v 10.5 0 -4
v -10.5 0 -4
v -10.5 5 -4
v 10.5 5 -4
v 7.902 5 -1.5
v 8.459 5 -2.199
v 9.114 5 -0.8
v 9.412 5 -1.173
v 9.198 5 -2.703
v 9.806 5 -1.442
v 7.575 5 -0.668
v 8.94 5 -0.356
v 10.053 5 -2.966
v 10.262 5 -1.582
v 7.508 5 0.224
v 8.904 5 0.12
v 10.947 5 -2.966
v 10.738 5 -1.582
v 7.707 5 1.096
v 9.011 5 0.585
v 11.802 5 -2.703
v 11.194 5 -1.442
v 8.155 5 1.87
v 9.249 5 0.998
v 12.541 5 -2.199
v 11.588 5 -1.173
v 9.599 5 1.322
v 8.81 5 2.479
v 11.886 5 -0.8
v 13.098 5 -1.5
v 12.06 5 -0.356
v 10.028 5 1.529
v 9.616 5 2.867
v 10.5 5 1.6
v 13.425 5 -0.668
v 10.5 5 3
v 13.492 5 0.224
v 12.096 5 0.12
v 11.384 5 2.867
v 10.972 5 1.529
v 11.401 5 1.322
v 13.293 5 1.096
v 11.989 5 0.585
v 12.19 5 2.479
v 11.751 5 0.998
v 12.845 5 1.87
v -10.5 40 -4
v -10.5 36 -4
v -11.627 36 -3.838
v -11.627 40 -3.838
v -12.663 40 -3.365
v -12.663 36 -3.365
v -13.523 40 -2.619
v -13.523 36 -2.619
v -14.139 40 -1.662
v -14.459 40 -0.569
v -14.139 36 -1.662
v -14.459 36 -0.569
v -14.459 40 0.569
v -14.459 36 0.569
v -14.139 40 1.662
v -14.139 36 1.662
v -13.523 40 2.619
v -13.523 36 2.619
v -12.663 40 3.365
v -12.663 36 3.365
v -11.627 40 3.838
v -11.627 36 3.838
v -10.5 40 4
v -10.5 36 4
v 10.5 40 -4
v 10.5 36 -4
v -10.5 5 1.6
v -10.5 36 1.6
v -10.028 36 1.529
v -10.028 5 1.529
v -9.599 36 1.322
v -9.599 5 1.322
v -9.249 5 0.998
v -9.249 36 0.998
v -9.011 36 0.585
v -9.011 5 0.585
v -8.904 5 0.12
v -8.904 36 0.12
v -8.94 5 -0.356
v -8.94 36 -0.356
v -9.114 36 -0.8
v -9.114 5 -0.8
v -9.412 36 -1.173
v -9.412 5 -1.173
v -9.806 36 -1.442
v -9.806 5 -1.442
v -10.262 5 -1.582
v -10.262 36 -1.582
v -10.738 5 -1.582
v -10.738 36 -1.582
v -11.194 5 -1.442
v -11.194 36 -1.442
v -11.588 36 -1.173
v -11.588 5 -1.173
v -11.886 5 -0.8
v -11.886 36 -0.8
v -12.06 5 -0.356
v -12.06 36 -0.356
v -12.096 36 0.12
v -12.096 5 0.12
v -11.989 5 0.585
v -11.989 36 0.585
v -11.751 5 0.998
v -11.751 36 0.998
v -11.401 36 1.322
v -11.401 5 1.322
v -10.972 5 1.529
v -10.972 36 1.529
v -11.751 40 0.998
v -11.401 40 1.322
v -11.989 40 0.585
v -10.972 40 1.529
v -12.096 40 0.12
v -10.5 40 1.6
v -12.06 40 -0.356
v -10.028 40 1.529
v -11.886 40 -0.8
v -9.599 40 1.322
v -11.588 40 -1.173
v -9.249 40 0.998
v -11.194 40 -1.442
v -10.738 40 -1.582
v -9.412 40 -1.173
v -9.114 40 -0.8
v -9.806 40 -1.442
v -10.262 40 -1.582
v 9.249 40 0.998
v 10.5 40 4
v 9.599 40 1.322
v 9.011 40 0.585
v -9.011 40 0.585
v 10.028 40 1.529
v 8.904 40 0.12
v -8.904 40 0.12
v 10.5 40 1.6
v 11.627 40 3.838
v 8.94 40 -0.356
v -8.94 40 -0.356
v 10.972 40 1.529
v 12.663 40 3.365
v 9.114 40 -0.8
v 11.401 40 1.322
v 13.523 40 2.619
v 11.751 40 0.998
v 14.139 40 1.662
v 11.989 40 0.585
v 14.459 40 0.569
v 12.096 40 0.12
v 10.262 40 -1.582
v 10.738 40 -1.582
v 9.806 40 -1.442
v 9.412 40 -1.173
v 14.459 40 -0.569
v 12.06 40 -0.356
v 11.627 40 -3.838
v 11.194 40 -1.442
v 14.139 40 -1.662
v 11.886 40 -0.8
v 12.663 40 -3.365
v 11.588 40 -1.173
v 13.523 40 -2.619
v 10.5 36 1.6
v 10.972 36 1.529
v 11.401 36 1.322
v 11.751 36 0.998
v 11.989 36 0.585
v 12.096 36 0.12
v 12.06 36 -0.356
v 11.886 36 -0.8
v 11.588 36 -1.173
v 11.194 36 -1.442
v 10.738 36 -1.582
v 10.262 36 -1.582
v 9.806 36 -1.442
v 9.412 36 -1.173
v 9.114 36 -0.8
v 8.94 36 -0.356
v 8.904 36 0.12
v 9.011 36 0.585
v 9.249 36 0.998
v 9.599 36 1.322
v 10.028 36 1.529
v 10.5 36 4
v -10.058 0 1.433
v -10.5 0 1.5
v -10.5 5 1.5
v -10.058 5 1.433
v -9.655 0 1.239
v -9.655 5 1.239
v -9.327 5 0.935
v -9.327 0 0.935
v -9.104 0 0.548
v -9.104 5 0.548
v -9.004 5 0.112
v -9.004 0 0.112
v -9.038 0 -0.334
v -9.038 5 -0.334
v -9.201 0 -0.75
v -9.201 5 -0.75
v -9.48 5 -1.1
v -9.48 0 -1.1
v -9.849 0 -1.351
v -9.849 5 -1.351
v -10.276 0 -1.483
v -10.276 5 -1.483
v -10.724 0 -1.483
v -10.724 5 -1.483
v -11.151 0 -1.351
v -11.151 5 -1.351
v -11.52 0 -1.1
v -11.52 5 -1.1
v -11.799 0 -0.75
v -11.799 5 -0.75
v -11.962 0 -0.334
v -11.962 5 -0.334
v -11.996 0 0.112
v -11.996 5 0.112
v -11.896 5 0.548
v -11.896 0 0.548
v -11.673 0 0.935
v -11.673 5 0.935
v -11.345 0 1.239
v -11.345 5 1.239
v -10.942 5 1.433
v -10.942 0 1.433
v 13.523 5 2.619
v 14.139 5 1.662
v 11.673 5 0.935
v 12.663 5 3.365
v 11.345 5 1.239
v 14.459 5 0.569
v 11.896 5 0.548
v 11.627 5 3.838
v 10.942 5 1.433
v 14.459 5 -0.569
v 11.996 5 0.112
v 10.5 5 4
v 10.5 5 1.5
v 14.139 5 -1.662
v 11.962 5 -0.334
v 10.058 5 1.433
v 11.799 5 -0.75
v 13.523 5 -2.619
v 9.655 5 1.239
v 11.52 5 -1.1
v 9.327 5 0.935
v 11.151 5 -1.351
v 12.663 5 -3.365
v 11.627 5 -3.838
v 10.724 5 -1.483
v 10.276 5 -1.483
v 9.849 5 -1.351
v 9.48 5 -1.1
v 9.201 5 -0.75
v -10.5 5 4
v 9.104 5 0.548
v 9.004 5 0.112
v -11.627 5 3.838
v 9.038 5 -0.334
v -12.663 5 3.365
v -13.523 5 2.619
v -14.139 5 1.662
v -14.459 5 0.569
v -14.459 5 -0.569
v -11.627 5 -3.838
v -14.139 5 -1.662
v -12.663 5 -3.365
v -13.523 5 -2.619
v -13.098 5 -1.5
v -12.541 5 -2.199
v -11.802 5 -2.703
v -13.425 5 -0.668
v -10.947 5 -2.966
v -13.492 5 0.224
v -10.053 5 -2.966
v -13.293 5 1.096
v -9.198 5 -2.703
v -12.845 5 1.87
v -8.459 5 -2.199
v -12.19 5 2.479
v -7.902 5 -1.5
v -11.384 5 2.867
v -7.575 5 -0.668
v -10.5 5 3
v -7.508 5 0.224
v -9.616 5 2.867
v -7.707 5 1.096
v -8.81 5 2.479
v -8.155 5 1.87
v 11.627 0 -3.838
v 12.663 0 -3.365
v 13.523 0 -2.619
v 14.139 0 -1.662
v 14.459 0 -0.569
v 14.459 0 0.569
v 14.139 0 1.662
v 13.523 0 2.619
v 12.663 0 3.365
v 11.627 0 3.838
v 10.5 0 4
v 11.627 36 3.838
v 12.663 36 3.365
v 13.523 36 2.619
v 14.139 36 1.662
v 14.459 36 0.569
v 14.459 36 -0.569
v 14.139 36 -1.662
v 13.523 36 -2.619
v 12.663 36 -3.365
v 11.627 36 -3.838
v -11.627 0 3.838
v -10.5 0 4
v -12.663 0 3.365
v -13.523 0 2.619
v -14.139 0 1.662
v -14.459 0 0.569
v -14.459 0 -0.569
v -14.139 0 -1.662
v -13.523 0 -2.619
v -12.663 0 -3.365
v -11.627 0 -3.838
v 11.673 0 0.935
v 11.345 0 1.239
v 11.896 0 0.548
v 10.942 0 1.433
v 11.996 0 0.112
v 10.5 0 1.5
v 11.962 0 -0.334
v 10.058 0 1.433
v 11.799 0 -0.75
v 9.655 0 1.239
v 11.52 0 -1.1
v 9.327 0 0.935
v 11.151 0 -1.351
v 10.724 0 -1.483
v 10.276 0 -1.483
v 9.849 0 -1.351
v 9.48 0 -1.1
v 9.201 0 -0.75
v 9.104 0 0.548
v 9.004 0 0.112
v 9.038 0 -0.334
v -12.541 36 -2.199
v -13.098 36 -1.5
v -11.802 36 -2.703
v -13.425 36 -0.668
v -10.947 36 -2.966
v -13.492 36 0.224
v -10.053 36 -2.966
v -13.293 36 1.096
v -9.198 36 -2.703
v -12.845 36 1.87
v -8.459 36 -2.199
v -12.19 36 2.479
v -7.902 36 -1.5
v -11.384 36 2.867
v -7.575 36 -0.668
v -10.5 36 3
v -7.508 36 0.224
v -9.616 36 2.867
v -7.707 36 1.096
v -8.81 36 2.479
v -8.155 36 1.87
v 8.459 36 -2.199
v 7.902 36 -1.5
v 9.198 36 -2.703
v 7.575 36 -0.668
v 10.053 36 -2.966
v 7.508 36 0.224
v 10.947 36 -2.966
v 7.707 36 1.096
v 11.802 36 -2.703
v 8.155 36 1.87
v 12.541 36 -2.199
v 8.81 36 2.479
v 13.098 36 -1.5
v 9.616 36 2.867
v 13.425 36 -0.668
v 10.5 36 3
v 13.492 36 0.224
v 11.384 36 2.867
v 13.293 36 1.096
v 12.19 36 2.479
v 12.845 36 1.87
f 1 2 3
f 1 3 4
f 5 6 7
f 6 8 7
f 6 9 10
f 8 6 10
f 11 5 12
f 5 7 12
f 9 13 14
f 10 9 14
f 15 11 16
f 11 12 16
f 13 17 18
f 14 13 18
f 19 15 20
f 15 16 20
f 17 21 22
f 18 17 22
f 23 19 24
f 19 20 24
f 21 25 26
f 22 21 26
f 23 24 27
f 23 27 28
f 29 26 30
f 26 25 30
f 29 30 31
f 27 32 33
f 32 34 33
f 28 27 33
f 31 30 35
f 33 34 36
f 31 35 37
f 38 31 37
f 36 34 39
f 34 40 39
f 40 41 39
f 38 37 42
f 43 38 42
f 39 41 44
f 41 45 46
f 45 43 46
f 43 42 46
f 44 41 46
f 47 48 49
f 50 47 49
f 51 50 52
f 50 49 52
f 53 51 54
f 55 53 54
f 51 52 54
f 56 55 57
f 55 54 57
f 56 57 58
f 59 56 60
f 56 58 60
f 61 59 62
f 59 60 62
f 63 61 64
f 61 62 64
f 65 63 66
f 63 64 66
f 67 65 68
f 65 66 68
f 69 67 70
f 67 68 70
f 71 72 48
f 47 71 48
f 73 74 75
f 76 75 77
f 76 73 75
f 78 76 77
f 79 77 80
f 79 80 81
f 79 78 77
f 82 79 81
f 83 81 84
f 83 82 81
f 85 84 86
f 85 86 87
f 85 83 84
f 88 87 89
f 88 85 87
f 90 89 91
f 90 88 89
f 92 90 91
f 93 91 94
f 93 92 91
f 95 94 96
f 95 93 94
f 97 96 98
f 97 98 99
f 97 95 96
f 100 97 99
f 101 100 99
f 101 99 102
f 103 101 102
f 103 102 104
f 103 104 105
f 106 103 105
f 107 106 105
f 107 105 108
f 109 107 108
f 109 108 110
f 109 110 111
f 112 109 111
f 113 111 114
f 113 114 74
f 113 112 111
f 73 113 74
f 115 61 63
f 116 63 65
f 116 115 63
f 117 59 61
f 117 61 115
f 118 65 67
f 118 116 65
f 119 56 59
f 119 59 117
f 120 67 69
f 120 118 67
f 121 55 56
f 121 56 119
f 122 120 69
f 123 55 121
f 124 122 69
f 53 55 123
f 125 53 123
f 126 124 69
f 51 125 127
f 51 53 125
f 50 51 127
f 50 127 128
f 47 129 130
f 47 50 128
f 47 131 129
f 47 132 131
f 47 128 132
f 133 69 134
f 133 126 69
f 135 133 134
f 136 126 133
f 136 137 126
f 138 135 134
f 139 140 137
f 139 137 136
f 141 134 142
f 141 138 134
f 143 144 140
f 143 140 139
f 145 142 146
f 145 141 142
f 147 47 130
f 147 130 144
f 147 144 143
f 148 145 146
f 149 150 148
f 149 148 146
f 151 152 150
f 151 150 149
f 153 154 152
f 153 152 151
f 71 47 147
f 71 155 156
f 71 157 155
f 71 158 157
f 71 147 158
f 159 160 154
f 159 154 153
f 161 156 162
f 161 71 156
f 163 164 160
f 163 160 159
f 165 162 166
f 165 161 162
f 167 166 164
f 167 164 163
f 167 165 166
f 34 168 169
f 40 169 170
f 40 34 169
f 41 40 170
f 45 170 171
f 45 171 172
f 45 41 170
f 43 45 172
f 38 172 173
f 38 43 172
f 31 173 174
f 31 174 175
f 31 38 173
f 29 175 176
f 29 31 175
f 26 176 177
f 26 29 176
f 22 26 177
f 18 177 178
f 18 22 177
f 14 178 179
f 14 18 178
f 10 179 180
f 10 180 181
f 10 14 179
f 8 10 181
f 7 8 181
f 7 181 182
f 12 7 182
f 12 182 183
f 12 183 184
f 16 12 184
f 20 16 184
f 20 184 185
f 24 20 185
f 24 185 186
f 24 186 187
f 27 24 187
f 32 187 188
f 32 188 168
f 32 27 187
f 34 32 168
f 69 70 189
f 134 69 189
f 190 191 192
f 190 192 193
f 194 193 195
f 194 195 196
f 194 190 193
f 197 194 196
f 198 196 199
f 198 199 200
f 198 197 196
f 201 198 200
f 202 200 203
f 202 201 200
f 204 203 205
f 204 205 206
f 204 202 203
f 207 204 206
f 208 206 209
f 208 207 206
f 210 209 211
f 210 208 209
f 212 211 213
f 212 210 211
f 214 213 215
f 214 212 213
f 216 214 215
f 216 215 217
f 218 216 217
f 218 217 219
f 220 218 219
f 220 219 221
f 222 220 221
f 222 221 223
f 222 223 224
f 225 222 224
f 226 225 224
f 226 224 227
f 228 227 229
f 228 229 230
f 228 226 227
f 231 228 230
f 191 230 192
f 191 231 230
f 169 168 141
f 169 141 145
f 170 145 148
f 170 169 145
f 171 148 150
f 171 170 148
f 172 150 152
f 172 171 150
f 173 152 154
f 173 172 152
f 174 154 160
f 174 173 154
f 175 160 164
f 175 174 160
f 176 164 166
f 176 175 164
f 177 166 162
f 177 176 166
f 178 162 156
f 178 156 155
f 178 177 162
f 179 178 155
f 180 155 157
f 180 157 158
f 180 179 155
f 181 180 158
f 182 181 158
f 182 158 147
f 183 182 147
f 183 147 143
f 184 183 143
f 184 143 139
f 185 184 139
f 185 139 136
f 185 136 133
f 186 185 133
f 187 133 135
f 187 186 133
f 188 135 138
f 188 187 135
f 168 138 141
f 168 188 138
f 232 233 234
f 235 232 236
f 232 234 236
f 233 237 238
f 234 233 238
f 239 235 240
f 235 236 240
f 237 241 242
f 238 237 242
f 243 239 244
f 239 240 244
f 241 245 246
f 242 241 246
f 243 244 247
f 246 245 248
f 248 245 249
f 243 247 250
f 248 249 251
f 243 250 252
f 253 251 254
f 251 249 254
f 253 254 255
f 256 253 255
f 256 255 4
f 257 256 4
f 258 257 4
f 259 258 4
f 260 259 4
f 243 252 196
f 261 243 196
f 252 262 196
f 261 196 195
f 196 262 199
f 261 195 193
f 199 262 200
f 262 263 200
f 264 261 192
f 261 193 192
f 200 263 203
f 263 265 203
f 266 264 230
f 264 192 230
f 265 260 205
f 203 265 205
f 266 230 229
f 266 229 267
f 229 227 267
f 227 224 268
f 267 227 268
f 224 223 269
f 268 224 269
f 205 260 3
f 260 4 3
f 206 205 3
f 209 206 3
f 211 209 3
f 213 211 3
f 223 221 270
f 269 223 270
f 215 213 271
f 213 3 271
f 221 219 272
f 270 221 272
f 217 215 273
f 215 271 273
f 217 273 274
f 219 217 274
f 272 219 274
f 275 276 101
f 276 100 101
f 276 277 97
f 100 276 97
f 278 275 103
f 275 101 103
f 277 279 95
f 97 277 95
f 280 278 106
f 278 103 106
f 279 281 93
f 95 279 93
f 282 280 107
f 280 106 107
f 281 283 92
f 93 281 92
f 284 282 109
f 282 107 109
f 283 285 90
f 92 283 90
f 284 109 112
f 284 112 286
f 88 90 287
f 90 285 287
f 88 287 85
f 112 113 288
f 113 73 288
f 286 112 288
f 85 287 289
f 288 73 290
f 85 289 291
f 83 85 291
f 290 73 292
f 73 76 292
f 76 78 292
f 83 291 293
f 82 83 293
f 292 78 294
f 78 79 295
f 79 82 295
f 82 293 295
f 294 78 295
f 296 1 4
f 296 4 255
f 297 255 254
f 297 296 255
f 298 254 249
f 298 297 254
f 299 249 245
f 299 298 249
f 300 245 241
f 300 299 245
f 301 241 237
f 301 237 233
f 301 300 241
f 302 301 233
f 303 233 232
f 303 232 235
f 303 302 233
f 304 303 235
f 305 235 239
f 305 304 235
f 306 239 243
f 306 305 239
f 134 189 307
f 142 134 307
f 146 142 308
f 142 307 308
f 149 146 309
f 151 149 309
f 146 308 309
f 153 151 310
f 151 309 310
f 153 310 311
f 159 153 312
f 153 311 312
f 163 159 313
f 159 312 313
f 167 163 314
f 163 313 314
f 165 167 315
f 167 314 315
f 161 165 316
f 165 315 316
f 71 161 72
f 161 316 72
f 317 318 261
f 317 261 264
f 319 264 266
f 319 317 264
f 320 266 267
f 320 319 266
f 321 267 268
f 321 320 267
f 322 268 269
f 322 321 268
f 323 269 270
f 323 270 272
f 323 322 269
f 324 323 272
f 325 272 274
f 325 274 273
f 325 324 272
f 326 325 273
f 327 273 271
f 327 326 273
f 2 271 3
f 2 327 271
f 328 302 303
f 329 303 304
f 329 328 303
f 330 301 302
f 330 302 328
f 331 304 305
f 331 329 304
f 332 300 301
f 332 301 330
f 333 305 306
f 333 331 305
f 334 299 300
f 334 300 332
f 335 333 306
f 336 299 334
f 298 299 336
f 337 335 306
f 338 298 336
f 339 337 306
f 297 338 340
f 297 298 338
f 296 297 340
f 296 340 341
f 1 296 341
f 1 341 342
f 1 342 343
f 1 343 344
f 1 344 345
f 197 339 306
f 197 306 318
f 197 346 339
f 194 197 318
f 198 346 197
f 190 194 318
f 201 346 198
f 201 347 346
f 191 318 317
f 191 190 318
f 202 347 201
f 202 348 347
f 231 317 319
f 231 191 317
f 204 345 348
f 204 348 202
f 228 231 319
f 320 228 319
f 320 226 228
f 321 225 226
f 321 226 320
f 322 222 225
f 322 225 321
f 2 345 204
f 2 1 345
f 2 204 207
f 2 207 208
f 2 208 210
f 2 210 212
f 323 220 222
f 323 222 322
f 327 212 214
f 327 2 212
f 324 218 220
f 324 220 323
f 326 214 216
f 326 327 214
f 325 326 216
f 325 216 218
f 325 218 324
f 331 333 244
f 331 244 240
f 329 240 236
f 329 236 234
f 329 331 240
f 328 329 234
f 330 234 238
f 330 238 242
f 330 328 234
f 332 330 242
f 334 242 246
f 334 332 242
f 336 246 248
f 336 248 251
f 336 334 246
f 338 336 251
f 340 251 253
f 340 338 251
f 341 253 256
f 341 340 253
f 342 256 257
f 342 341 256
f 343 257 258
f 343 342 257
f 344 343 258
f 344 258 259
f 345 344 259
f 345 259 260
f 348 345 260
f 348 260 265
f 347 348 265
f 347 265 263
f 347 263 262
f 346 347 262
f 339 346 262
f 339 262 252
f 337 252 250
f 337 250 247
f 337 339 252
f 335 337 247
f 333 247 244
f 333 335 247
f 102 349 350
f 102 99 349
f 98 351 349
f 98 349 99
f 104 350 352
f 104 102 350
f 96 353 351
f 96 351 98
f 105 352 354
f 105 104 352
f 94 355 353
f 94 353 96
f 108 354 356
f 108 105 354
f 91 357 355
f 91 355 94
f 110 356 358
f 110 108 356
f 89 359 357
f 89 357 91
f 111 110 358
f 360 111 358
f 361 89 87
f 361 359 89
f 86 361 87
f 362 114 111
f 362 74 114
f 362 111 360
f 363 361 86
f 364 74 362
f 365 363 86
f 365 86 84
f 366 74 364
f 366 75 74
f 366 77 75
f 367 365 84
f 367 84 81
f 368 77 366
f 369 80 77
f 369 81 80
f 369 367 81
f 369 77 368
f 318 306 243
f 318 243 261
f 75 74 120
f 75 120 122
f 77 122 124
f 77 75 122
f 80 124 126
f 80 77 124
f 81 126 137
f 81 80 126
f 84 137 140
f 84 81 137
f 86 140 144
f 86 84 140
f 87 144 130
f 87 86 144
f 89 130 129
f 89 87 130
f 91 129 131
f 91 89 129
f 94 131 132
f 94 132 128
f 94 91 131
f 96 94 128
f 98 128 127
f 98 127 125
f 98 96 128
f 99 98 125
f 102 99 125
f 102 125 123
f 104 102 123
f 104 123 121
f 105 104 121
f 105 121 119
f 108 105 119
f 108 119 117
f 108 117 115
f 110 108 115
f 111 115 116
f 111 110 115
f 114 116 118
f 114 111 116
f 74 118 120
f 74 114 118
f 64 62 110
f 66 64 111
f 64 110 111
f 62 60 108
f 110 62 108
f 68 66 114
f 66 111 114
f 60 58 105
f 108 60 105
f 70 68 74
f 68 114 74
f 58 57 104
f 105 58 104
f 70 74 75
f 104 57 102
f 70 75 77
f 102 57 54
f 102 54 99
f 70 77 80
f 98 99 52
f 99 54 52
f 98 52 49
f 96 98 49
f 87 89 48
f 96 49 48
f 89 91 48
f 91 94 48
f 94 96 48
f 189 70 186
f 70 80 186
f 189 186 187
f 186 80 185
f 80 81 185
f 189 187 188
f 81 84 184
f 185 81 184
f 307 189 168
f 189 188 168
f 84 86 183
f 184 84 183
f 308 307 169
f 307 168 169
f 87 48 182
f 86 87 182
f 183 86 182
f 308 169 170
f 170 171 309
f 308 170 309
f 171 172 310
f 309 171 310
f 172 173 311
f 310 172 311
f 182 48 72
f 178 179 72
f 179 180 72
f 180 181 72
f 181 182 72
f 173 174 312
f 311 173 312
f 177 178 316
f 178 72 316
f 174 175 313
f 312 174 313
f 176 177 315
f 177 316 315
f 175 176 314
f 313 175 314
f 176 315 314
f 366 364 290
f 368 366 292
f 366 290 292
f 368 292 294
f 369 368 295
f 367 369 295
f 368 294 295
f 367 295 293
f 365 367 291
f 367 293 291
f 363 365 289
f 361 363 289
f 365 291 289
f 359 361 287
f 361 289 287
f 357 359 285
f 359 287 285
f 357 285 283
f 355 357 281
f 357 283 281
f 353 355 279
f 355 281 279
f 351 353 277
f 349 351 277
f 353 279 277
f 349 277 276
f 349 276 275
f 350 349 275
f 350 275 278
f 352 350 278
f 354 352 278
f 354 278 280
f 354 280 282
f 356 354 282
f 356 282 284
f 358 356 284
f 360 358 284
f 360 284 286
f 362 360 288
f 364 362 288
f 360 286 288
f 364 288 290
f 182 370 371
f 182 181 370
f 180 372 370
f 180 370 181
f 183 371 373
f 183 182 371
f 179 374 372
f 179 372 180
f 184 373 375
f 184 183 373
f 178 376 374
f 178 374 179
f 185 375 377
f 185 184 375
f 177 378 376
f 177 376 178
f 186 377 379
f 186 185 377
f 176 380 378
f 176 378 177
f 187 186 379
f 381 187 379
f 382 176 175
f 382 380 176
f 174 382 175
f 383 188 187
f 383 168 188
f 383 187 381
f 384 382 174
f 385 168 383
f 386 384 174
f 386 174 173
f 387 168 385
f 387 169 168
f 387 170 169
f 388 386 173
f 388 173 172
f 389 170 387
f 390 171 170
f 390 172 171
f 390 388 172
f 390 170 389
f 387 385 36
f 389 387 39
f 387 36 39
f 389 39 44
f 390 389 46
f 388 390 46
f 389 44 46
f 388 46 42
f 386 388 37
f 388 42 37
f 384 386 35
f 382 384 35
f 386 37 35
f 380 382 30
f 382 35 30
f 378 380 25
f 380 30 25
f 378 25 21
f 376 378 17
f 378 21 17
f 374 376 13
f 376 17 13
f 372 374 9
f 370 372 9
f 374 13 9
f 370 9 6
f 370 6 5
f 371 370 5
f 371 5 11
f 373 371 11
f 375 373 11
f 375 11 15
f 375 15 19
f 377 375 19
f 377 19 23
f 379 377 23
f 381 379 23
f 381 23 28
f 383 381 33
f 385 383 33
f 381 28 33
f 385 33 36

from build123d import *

# Parameters (mm, degrees)
SKETCH_1_R        = 1.5
EXTRUDE_1_DEPTH   = 5
SKETCH_2_R        = 3
SKETCH_2_R_2      = 1.6
EXTRUDE_2_DEPTH   = 31
EXTRUDE_2_2_DEPTH = 31
SKETCH_3_R        = 1.6
EXTRUDE_3_DEPTH   = 4


with BuildPart() as part:
    # ｽｹｯﾁ1 → ﾎﾞｽ - 押し出し1 (new body)
    with BuildSketch(Plane(origin=(0, 0, 0), x_dir=(1, 0, 0), z_dir=(0, 1, 0))):
        with BuildLine():
            Line((-10.5, 4), (10.5, 4))
            ThreePointArc((10.5, 4), (14.5, 0), (10.5, -4))
            Line((10.5, -4), (-10.5, -4))
            ThreePointArc((-10.5, -4), (-14.5, 0), (-10.5, 4))
        make_face()
        with Locations(Location((-10.5, 0, 0), (0, 0, 270))):
            Circle(SKETCH_1_R, mode=Mode.SUBTRACT)
        with Locations(Location((10.5, 0, 0), (0, 0, 270))):
            Circle(SKETCH_1_R, mode=Mode.SUBTRACT)
    extrude(amount=EXTRUDE_1_DEPTH)


with BuildPart() as body_2:
    # ｽｹｯﾁ2 → ﾎﾞｽ - 押し出し2 (new body)
    with BuildSketch(Plane(origin=(0, 5, 0), x_dir=(1, 0, 0), z_dir=(0, 1, 0))):
        with Locations(Location((-10.5, 0, 0), (0, 0, 270))):
            Circle(SKETCH_2_R)
        with Locations(Location((-10.5, 0, 0), (0, 0, 270))):
            Circle(SKETCH_2_R_2, mode=Mode.SUBTRACT)
    extrude(amount=EXTRUDE_2_DEPTH)


with BuildPart() as body_3:
    # ｽｹｯﾁ2 → Extrude 2 2 (new body)
    with BuildSketch(Plane(origin=(0, 5, 0), x_dir=(1, 0, 0), z_dir=(0, 1, 0))):
        with Locations(Location((10.5, 0, 0), (0, 0, 270))):
            Circle(SKETCH_2_R)
        with Locations(Location((10.5, 0, 0), (0, 0, 270))):
            Circle(SKETCH_2_R_2, mode=Mode.SUBTRACT)
    extrude(amount=EXTRUDE_2_2_DEPTH)


with BuildPart() as body_4:
    # ｽｹｯﾁ3 → ﾎﾞｽ - 押し出し3 (new body)
    with BuildSketch(Plane(origin=(0, 36, 0), x_dir=(1, 0, 0), z_dir=(0, 1, 0))):
        with BuildLine():
            Line((-10.5, -4), (10.5, -4))
            ThreePointArc((10.5, -4), (14.5, 0), (10.5, 4))
            Line((10.5, 4), (-10.5, 4))
            ThreePointArc((-10.5, 4), (-14.5, 0), (-10.5, -4))
        make_face()
        with Locations(Location((10.5, 0, 0), (0, 0, 270))):
            Circle(SKETCH_3_R, mode=Mode.SUBTRACT)
        with Locations(Location((-10.5, 0, 0), (0, 0, 270))):
            Circle(SKETCH_3_R, mode=Mode.SUBTRACT)
    extrude(amount=EXTRUDE_3_DEPTH)


solid = Compound([part.part, body_2.part, body_3.part, body_4.part])
